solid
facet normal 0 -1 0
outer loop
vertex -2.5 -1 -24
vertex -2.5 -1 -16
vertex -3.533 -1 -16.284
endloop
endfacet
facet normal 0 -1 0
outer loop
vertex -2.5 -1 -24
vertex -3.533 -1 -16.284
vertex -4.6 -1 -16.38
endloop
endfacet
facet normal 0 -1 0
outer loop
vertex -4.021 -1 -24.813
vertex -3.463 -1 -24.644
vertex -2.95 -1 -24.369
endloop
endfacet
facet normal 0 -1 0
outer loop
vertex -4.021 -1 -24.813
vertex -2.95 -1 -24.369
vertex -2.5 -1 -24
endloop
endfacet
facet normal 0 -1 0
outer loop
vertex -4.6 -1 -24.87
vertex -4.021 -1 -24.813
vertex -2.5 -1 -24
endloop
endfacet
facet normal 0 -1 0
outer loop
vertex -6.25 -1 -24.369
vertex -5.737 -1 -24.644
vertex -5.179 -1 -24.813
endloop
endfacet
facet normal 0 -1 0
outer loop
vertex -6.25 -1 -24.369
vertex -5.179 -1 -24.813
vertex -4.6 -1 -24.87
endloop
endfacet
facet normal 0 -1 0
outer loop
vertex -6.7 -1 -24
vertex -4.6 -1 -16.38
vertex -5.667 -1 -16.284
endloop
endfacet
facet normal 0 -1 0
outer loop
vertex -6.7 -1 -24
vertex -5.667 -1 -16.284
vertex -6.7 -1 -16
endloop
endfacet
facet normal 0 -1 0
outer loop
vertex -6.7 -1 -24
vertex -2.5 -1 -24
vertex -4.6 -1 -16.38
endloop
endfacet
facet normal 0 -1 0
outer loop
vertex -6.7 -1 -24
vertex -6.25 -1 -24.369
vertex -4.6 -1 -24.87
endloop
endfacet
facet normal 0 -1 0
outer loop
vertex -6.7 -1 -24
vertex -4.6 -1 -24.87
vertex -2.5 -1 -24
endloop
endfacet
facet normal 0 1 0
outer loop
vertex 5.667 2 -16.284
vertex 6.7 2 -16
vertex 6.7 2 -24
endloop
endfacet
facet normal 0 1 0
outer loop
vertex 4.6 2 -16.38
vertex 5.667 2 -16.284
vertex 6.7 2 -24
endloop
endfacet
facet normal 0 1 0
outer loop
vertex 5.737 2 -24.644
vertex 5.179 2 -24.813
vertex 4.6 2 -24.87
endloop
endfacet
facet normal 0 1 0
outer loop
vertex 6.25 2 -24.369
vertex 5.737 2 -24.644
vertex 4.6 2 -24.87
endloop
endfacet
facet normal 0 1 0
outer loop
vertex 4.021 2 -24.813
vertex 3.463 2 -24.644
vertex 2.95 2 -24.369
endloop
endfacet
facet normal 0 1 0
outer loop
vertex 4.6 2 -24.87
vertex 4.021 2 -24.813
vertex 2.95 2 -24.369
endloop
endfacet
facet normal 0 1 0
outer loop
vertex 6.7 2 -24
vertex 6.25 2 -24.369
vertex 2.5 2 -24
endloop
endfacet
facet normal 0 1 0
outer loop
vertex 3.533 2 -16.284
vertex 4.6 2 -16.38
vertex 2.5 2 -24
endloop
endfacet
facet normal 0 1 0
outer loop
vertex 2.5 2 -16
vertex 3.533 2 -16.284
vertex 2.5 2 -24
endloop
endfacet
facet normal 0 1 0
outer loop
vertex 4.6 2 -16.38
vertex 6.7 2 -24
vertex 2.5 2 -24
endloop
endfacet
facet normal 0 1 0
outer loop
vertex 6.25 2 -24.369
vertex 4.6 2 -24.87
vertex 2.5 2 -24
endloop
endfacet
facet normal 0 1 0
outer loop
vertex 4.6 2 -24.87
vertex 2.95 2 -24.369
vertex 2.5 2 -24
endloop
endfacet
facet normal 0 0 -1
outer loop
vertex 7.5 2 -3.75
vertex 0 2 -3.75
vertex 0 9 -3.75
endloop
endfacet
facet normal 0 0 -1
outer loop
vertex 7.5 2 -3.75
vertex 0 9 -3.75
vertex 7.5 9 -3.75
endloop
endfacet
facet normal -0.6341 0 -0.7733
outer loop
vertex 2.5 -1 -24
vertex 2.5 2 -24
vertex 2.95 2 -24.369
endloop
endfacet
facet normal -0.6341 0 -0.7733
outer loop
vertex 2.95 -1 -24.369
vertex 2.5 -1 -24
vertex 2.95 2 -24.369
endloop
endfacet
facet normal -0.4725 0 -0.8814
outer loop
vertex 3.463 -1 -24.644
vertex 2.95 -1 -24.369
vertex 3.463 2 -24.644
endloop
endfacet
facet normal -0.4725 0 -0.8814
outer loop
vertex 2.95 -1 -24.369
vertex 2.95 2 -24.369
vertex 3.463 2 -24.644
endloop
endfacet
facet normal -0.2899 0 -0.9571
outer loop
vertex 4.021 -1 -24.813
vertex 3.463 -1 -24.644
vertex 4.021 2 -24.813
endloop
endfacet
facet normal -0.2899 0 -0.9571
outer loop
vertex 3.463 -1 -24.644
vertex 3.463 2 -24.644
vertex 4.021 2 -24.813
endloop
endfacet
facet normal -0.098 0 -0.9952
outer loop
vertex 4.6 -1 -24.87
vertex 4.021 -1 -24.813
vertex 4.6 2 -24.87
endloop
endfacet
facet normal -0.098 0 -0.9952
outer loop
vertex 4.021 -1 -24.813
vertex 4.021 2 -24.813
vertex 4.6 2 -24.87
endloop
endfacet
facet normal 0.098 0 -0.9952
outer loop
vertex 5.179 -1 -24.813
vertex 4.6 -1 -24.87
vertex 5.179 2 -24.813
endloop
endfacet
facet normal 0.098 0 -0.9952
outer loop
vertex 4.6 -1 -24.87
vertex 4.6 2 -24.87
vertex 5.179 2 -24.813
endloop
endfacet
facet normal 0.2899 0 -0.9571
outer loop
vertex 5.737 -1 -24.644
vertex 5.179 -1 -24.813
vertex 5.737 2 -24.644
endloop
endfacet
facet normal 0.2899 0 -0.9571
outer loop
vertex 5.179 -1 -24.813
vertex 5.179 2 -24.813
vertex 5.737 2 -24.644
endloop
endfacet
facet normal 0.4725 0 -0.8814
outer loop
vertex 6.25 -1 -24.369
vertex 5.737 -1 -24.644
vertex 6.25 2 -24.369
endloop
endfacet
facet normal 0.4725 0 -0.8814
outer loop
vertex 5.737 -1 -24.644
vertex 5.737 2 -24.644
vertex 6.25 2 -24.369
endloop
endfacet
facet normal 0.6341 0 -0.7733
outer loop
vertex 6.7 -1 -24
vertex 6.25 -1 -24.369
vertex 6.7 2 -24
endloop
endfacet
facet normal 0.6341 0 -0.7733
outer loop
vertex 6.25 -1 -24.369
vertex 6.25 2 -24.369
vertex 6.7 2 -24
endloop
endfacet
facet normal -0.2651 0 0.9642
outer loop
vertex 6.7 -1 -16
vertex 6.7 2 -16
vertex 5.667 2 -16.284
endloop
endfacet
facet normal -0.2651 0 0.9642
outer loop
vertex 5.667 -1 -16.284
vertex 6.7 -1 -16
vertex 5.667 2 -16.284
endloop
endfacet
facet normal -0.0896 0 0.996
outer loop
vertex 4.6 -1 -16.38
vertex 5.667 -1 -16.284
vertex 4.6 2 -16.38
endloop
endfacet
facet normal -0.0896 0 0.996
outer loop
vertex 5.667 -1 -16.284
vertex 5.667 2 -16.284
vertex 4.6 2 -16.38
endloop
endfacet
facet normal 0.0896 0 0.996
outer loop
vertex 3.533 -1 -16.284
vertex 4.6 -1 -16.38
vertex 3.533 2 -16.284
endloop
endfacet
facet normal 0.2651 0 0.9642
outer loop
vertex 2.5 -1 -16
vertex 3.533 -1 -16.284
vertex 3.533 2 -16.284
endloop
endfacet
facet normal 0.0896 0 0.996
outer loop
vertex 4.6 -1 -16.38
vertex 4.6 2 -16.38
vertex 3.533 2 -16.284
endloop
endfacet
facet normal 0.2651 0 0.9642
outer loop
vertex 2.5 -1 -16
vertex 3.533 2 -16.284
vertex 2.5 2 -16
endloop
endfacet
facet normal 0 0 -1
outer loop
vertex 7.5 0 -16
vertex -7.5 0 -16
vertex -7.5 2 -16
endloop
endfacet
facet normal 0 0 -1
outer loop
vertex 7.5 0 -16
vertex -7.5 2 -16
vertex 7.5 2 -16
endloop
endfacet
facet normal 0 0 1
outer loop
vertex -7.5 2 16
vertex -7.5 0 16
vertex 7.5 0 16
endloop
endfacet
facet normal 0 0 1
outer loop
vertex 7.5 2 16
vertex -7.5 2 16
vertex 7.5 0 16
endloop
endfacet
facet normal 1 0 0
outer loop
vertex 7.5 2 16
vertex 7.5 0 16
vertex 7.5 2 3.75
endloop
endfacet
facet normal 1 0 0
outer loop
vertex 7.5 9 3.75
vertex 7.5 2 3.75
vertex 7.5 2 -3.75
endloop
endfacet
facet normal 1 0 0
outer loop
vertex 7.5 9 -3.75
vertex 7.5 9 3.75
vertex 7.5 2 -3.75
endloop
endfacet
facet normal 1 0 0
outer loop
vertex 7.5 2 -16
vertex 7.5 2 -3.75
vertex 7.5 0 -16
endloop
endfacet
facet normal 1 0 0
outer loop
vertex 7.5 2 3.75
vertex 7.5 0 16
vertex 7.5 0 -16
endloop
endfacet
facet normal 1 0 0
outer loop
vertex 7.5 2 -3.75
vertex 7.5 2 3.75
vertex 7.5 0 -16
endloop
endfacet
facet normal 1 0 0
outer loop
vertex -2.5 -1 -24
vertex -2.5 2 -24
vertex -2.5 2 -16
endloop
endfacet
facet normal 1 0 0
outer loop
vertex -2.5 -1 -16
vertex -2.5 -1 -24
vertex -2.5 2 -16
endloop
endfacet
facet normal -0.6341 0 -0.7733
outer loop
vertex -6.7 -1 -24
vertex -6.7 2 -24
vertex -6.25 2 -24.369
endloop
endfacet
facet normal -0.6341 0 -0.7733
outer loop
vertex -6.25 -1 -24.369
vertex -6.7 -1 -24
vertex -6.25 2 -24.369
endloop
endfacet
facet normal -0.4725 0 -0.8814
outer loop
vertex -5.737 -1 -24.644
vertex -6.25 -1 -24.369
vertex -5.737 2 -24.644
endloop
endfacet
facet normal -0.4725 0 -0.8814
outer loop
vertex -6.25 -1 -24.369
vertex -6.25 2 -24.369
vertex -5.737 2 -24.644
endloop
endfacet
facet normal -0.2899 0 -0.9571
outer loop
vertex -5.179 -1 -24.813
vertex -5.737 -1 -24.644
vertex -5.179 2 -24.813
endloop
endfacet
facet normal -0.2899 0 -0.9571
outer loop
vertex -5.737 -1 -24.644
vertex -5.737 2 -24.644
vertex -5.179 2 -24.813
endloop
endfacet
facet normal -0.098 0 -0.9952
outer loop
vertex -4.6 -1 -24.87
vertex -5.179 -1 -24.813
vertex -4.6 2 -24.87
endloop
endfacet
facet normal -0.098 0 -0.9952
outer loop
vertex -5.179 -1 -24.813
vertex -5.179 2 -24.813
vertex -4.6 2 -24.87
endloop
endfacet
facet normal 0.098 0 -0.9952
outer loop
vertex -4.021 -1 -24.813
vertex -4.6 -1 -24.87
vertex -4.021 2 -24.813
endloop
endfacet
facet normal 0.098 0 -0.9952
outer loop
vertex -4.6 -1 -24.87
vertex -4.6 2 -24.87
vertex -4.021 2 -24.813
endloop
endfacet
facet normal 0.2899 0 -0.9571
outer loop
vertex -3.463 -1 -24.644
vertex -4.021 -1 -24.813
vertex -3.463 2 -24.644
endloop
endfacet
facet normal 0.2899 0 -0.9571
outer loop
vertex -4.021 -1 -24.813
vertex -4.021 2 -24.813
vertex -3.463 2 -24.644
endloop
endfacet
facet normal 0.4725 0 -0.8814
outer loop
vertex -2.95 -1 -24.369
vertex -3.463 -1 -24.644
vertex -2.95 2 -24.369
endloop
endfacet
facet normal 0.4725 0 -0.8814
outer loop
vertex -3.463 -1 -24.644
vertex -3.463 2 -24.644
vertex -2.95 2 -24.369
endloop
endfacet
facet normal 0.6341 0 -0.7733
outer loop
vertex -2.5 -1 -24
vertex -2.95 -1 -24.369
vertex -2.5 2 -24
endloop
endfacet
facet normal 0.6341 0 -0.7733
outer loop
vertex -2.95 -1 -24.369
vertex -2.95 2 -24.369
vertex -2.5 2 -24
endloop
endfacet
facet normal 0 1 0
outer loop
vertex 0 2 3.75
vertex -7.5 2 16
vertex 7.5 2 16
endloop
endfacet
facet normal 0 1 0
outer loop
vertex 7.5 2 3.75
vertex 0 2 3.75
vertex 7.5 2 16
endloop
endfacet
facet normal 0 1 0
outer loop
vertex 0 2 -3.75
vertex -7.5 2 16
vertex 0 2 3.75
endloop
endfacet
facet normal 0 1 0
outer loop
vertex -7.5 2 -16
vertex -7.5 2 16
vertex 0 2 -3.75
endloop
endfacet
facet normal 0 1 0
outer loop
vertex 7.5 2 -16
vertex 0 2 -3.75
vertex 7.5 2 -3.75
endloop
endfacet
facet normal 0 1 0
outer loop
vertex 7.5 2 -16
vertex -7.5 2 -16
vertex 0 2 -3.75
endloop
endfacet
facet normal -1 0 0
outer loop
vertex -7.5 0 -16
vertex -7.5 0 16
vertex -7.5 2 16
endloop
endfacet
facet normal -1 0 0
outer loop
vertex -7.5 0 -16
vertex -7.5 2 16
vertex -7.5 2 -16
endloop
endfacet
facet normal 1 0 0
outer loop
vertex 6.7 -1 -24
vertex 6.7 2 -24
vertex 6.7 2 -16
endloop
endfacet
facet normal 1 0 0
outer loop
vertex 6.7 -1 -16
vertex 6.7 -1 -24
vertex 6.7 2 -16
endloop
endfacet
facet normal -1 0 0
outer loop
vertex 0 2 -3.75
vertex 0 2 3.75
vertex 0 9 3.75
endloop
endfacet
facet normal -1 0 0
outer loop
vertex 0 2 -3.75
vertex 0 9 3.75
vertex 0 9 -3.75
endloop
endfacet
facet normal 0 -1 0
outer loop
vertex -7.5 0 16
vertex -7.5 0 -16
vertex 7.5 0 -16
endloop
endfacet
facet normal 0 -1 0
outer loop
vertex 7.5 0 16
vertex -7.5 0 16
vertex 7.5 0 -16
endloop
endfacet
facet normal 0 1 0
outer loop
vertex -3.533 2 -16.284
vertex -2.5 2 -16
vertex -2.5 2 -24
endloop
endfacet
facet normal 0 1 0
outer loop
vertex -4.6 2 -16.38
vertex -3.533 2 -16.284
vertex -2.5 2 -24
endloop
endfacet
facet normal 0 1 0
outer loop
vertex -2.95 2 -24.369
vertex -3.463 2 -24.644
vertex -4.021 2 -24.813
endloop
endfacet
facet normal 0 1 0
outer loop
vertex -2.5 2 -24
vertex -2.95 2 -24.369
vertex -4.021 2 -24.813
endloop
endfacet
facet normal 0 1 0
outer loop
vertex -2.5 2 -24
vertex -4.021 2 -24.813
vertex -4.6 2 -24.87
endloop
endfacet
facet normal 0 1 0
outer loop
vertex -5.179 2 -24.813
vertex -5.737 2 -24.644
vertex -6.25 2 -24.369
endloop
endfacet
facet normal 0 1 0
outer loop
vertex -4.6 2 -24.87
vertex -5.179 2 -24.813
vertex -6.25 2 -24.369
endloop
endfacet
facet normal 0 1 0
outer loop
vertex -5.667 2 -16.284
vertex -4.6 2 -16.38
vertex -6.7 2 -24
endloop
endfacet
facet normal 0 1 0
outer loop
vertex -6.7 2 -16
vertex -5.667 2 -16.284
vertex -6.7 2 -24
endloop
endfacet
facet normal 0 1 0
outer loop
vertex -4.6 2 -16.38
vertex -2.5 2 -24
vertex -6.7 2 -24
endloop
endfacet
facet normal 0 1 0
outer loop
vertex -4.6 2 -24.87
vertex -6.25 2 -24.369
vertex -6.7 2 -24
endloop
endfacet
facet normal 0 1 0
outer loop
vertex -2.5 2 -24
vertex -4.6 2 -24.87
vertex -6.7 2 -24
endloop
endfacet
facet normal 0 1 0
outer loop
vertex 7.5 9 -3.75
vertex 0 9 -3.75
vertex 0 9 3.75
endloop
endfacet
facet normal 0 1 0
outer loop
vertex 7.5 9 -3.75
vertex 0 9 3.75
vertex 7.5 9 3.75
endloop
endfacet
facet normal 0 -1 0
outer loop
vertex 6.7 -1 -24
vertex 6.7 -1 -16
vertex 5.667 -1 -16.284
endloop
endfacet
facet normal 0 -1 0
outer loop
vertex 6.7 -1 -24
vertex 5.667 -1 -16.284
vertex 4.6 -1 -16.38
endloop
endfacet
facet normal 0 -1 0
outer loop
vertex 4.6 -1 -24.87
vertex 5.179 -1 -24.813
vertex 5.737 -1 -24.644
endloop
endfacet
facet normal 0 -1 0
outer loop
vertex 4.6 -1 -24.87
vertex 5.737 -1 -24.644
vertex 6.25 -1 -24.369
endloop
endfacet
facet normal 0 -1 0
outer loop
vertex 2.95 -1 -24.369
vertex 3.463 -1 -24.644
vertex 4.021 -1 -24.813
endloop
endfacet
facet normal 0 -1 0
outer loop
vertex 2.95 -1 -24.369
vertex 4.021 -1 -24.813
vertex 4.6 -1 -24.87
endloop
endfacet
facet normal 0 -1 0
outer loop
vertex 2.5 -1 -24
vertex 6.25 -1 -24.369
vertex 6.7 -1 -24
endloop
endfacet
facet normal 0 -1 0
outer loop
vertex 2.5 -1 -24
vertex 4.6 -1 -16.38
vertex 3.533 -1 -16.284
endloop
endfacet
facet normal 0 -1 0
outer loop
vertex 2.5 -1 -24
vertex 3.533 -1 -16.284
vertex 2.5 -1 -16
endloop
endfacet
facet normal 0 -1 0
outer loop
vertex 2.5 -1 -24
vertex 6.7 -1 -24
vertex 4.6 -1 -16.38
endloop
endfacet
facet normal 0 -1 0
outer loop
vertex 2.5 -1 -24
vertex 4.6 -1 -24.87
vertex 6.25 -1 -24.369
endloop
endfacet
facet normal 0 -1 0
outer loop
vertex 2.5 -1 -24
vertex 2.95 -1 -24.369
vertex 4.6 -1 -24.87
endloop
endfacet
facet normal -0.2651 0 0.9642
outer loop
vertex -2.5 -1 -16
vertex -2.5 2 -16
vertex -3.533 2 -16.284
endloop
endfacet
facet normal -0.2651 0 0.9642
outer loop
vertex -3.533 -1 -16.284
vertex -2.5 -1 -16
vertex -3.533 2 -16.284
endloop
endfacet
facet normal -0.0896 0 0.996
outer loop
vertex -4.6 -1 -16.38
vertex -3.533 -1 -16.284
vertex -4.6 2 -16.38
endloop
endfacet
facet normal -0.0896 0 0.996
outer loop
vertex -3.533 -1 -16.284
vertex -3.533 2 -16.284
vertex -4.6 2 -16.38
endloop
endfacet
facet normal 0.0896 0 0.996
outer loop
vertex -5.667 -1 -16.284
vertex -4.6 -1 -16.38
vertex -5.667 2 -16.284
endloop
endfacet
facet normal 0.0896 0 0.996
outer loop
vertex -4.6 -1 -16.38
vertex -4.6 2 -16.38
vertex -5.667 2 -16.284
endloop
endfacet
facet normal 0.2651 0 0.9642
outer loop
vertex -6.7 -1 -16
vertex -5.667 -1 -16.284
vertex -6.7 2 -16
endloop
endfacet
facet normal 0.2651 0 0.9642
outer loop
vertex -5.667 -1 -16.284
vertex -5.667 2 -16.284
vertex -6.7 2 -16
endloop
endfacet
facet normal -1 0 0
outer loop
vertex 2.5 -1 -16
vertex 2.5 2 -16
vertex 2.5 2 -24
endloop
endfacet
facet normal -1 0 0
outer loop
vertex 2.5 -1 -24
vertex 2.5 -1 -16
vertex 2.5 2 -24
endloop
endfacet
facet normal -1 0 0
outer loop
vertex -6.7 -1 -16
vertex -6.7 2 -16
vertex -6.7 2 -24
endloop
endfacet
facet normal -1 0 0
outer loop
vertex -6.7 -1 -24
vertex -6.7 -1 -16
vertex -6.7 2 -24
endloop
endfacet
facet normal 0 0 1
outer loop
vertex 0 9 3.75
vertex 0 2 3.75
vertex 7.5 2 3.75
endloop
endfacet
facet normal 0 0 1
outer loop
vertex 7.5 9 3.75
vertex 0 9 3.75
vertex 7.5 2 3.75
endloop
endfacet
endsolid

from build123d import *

# Parameters (mm, degrees)
SKETCH1_W             = 15
SKETCH1_H             = 32
BOSS_EXTRUDE1_DEPTH   = 2
SKETCH2_W             = 7.5
SKETCH2_H             = 7.5
BOSS_EXTRUDE2_DEPTH   = 7
BOSS_EXTRUDE3_DEPTH   = 3
BOSS_EXTRUDE3_2_DEPTH = 3


with BuildPart() as part:
    # Sketch1 → Boss-Extrude1 (new body)
    with BuildSketch(Plane(origin=(0, 0, 0), x_dir=(1, 0, 0), z_dir=(0, 1, 0))):
        Rectangle(SKETCH1_W, SKETCH1_H)
    extrude(amount=BOSS_EXTRUDE1_DEPTH)

    # Sketch2 → Boss-Extrude2 (add)
    with BuildSketch(Plane(origin=(0, 2, 0), x_dir=(1, 0, 0), z_dir=(0, 1, 0))):
        with Locations((3.75, 0)):
            Rectangle(SKETCH2_W, SKETCH2_H)
    extrude(amount=BOSS_EXTRUDE2_DEPTH)


with BuildPart() as body_2:
    # Sketch6 → Boss-Extrude3 (new body)
    with BuildSketch(Plane(origin=(0, 2, 0), x_dir=(1, 0, 0), z_dir=(0, 1, 0))):
        with BuildLine():
            Line((-6.7, 16), (-6.7, 24))
            ThreePointArc((-6.7, 24), (-4.6, 24.869848481), (-2.5, 24))
            Line((-2.5, 24), (-2.5, 16))
            ThreePointArc((-2.5, 16), (-4.6, 16.379501801), (-6.7, 16))
        make_face()
    extrude(amount=-BOSS_EXTRUDE3_DEPTH)


with BuildPart() as body_3:
    # Sketch6 → Boss-Extrude3 2 (new body)
    with BuildSketch(Plane(origin=(0, 2, 0), x_dir=(1, 0, 0), z_dir=(0, 1, 0))):
        with BuildLine():
            Line((2.5, 16), (2.5, 24))
            ThreePointArc((2.5, 24), (4.6, 24.869848481), (6.7, 24))
            Line((6.7, 24), (6.7, 16))
            ThreePointArc((6.7, 16), (4.6, 16.379501801), (2.5, 16))
        make_face()
    extrude(amount=-BOSS_EXTRUDE3_2_DEPTH)


solid = Compound([part.part, body_2.part, body_3.part])
